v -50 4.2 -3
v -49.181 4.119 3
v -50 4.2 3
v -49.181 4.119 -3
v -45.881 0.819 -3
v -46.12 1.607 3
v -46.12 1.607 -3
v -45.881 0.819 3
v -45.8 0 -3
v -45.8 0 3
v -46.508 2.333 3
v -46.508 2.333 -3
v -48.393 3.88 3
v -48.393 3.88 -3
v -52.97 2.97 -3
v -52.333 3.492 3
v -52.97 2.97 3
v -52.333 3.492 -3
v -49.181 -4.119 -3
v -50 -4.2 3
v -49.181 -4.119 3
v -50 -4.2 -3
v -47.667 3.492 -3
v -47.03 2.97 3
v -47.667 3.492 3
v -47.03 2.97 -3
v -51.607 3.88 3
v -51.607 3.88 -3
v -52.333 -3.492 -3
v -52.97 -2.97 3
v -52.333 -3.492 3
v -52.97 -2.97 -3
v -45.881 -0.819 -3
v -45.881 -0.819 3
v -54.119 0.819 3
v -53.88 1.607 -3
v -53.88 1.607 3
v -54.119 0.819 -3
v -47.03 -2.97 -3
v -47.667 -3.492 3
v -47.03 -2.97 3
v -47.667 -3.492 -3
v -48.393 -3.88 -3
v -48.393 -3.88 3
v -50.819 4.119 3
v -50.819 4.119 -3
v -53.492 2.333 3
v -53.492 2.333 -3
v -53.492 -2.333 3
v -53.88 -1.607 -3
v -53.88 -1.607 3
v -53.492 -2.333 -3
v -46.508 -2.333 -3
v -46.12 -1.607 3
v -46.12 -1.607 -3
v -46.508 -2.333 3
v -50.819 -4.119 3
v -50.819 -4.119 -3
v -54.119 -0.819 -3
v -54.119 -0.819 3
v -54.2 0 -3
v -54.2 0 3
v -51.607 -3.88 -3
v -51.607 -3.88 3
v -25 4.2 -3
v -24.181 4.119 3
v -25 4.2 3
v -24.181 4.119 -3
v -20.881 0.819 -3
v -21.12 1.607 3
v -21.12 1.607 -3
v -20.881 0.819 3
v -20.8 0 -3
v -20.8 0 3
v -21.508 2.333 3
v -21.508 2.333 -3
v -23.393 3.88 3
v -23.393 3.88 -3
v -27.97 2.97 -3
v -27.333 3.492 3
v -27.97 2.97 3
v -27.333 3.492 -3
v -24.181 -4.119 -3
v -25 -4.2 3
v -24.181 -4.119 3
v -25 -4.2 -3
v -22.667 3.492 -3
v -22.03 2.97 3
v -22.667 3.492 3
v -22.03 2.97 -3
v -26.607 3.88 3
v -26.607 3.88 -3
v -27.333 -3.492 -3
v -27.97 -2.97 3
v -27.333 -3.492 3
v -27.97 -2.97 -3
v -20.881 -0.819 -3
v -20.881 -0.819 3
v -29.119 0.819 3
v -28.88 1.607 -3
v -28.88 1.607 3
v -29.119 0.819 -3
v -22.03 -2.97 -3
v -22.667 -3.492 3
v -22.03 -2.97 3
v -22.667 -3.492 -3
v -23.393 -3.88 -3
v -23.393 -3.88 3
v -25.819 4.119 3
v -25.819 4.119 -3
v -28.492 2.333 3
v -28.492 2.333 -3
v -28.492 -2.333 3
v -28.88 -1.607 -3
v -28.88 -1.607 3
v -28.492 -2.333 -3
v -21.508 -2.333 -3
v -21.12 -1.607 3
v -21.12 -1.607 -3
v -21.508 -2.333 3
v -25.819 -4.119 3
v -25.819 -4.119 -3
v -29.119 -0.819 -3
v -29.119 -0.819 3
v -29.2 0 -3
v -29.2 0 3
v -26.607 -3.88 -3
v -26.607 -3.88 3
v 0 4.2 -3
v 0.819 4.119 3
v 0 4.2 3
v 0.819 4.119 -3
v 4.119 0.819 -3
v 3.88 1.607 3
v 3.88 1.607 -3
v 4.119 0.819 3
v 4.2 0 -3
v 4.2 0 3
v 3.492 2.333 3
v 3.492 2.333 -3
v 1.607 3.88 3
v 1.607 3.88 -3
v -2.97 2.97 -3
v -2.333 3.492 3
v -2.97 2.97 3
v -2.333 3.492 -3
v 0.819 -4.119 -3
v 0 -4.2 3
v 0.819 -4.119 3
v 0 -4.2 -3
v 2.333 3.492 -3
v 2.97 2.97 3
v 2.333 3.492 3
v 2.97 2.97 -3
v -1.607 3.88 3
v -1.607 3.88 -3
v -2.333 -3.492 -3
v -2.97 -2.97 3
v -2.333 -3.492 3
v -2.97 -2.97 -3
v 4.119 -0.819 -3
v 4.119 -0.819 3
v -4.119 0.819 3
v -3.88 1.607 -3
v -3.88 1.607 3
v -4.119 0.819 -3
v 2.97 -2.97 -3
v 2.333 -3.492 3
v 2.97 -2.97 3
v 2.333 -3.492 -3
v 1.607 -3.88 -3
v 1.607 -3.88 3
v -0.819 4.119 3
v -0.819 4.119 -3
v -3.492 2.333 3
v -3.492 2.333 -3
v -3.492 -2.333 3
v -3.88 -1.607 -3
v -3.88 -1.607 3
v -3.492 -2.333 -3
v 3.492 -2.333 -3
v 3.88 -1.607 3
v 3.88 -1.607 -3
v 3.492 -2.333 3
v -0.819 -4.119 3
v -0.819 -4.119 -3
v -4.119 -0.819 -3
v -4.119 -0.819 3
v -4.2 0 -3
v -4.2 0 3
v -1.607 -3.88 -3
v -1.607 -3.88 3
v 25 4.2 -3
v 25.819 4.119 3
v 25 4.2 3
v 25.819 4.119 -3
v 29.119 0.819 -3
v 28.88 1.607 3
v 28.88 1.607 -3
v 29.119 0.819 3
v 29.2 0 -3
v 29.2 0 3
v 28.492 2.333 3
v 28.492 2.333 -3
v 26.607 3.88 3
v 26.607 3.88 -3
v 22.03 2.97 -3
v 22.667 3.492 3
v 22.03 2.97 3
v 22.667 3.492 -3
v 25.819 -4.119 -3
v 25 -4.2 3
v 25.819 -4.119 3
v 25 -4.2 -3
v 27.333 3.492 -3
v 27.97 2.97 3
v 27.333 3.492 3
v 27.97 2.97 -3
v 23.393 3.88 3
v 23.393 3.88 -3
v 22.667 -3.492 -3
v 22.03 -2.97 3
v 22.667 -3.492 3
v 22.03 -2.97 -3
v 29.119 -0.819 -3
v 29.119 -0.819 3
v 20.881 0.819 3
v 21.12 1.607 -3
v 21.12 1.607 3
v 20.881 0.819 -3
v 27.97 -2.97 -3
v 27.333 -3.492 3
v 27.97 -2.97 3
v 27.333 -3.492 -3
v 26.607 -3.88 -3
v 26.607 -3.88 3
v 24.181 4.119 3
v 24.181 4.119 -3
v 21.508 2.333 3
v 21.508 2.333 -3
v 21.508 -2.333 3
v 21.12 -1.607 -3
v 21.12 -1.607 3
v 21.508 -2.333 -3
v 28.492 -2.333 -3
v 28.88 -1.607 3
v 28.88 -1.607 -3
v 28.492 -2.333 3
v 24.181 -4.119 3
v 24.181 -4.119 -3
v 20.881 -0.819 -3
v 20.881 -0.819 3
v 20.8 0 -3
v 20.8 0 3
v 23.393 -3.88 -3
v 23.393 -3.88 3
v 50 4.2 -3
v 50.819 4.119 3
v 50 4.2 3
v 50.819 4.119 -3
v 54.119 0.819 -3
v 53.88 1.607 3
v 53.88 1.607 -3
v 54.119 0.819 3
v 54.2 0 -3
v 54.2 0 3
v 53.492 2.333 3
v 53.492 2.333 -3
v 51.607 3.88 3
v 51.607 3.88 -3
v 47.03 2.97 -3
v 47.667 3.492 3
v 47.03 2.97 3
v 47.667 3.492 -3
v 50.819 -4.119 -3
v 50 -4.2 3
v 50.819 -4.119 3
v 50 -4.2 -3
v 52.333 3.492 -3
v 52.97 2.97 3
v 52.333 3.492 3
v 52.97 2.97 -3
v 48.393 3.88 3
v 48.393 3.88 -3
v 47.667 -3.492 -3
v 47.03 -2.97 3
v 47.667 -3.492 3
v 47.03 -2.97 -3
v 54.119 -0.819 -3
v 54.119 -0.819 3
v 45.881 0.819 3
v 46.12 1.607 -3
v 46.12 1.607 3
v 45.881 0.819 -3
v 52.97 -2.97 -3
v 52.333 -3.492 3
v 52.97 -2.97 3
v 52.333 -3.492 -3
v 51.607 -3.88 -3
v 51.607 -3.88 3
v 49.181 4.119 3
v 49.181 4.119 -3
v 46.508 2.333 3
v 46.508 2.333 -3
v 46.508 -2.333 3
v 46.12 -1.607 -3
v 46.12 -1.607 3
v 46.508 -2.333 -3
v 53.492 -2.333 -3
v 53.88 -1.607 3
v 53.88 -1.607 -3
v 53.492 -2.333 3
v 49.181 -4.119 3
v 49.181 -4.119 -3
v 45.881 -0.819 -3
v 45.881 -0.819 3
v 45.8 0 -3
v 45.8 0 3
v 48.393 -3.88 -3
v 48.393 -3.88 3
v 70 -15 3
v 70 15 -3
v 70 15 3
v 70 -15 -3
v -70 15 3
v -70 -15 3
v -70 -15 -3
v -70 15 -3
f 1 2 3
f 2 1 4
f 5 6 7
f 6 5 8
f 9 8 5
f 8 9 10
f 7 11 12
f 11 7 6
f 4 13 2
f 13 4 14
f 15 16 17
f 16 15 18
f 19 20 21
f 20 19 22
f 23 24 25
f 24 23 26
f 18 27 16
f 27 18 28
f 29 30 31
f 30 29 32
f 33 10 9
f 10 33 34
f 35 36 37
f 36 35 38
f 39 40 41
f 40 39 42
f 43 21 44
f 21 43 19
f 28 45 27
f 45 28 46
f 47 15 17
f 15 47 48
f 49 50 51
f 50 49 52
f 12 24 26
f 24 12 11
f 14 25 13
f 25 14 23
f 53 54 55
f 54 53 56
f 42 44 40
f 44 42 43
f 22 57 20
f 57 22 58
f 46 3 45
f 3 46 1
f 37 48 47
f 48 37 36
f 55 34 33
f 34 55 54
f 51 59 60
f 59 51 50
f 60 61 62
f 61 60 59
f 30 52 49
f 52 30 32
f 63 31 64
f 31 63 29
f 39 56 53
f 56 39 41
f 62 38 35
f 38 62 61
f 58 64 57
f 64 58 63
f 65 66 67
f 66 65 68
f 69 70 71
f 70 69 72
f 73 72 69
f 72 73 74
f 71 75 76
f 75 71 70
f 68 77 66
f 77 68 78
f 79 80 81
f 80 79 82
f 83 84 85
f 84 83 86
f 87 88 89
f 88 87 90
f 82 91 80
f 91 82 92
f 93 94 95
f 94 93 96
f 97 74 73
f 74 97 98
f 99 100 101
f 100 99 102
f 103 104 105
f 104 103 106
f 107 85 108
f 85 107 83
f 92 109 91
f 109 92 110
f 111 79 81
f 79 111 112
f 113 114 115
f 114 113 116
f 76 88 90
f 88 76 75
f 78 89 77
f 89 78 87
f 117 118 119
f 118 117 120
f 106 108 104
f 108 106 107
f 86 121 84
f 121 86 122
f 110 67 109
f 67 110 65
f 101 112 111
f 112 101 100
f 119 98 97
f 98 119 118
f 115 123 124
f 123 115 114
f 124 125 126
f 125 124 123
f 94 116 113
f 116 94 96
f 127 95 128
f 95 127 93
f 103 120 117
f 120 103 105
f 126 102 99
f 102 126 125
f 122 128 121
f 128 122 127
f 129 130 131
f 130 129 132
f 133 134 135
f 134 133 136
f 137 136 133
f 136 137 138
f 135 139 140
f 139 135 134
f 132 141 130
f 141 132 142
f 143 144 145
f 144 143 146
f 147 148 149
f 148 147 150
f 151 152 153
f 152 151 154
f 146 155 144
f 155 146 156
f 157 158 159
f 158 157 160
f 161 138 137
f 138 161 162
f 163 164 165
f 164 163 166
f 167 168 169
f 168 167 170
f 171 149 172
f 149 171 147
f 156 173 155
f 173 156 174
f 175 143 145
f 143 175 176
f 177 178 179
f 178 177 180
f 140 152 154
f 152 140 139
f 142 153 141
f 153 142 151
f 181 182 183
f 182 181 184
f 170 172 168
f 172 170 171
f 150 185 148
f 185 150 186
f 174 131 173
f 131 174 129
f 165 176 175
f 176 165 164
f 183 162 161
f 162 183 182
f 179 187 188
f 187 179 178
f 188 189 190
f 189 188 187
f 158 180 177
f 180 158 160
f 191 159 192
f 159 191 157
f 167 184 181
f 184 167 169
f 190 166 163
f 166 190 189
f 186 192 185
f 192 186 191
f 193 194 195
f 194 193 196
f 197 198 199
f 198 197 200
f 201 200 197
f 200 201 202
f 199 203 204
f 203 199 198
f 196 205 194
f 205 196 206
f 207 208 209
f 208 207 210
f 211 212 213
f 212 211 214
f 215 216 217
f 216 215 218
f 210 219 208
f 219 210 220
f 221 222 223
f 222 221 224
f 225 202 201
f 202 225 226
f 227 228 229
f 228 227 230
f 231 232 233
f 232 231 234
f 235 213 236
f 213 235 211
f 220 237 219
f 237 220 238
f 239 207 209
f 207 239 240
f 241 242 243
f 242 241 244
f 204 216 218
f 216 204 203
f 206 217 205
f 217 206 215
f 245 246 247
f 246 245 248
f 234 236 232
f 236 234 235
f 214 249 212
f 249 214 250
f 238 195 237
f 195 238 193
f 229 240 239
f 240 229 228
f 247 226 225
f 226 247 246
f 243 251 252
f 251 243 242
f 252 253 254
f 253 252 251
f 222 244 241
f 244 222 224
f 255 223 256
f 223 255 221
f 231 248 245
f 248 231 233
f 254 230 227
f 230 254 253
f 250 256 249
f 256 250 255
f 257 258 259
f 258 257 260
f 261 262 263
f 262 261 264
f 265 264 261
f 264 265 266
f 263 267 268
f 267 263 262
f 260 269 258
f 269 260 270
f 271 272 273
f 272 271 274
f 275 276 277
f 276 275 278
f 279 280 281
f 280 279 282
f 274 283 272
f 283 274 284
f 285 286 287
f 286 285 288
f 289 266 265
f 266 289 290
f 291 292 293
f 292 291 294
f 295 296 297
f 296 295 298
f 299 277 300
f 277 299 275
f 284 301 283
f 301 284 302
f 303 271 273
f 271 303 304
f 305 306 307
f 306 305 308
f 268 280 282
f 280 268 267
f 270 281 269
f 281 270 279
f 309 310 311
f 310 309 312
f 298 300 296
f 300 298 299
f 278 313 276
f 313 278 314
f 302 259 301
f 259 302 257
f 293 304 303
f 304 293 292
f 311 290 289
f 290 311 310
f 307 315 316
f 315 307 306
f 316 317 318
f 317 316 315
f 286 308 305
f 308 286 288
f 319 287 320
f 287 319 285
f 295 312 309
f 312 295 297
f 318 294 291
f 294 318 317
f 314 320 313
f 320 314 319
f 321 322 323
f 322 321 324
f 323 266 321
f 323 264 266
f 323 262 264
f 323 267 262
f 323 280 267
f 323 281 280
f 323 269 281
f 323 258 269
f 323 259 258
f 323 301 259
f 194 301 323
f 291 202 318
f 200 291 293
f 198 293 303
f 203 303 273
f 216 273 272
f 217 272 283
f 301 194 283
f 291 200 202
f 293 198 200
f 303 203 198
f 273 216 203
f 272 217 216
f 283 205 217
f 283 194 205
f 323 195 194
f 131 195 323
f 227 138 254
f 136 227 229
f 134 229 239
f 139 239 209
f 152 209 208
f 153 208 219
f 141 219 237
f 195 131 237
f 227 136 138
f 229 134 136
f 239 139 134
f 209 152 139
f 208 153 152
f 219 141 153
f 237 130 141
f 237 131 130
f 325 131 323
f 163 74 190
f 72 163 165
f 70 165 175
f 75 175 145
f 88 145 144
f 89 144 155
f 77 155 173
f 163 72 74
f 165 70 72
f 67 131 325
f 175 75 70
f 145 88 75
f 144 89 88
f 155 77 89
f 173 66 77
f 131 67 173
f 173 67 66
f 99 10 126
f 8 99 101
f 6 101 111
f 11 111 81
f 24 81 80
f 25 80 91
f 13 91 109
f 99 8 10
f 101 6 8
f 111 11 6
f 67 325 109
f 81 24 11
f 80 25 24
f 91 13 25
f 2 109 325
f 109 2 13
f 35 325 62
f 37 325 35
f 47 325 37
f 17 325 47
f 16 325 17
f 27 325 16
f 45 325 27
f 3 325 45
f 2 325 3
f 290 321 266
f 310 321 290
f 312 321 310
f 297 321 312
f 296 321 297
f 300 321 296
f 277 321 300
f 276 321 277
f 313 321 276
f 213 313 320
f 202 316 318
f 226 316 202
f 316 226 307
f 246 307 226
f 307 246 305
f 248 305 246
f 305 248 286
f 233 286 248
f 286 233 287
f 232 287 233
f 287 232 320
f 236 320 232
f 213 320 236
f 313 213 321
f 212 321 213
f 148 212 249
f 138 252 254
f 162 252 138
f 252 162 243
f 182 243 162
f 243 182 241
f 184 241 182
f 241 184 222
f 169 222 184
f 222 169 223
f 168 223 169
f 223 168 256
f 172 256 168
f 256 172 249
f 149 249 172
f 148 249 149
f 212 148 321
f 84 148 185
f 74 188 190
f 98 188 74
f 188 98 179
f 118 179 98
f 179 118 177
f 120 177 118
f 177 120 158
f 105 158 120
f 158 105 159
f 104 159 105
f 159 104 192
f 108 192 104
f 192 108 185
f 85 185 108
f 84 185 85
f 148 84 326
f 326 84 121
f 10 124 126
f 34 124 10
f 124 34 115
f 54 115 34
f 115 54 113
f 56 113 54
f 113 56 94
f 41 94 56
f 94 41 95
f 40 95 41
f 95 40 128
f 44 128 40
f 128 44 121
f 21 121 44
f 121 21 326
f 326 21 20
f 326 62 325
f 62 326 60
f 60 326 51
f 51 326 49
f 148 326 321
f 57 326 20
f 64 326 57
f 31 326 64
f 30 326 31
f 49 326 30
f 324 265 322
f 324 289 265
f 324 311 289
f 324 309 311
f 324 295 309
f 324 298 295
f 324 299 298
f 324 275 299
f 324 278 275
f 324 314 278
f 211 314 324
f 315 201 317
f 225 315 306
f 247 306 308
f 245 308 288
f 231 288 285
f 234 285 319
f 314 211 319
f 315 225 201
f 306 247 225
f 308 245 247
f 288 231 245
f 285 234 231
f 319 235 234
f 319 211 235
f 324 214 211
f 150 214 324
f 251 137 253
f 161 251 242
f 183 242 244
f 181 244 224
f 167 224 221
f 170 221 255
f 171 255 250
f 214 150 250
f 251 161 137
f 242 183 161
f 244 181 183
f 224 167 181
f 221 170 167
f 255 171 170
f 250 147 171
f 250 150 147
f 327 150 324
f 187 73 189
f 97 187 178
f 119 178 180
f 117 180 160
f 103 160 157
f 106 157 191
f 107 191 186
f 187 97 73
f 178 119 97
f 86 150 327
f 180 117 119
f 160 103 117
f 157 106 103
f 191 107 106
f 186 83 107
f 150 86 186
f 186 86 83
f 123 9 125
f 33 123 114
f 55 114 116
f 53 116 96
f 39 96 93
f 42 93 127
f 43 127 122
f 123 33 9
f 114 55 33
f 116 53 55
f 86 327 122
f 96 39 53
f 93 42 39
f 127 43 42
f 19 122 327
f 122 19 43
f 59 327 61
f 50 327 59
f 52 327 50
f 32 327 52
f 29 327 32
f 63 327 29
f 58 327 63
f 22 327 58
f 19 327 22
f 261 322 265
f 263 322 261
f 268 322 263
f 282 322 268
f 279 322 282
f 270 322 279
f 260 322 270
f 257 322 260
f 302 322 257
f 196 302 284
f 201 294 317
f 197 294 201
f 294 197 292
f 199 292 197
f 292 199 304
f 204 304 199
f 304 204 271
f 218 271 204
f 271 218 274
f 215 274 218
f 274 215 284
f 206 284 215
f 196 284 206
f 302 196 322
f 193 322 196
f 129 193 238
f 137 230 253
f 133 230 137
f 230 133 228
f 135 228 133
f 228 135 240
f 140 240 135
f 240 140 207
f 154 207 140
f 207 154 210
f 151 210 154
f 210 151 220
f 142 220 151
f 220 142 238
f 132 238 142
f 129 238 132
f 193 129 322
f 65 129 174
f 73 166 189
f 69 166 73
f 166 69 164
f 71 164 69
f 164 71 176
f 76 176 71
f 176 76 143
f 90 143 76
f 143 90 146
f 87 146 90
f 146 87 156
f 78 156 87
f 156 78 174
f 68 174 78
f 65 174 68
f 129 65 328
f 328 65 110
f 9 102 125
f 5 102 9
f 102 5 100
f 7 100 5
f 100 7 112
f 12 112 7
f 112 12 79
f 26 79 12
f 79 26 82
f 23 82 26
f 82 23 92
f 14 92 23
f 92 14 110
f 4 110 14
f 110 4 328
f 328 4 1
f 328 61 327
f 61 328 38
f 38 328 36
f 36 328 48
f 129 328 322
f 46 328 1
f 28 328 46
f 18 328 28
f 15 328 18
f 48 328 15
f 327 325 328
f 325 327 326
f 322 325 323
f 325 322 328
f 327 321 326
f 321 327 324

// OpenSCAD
$fn = 32;

// ----------------------------------------------------------------------
// Hole bar, 5 x Ø8.4
// skip layout, 20 mm edge offset
// ----------------------------------------------------------------------

// --- parameters (mm) ---
bar_w = 30;         // bar width (Y)
seat_tol = 0.05;    // tolerance at the seating features
free_tol = 0.3;     // general tolerance on the free sizes
bar_t = 6;          // bar thickness (Z)
holes = 5;          // holes per row
hole_d = 8.4;       // hole diameter
edge = 20;          // offset from the bar end to the first hole
grid_pitch = 12.5;  // grid the bar was laid out on

// --- derived feature positions (mm) ---
pitch = grid_pitch * 2;       // = 25   holes sit every other grid slot
span = (holes - 1) * pitch;   // = 100   distance between the end holes
bar_l = span + 2 * edge;      // = 140   overall bar length
start_x = -bar_l / 2 + edge;  // = -50   X of the first hole
feature_centers = [
  [start_x + 0 * pitch, 0],
  [start_x + 1 * pitch, 0],
  [start_x + 2 * pitch, 0],
  [start_x + 3 * pitch, 0],
  [start_x + 4 * pitch, 0]
];   // hole centres of the first row

// bar with one row of holes, drilled from feature_centers
difference() {
  translate([-bar_l / 2, -bar_w / 2, -bar_t / 2]) cube([bar_l, bar_w, bar_t]);
  for (centre = feature_centers)
    translate([centre[0], centre[1], 0])
      cylinder(d = hole_d, h = bar_t + 2, center = true);
}
